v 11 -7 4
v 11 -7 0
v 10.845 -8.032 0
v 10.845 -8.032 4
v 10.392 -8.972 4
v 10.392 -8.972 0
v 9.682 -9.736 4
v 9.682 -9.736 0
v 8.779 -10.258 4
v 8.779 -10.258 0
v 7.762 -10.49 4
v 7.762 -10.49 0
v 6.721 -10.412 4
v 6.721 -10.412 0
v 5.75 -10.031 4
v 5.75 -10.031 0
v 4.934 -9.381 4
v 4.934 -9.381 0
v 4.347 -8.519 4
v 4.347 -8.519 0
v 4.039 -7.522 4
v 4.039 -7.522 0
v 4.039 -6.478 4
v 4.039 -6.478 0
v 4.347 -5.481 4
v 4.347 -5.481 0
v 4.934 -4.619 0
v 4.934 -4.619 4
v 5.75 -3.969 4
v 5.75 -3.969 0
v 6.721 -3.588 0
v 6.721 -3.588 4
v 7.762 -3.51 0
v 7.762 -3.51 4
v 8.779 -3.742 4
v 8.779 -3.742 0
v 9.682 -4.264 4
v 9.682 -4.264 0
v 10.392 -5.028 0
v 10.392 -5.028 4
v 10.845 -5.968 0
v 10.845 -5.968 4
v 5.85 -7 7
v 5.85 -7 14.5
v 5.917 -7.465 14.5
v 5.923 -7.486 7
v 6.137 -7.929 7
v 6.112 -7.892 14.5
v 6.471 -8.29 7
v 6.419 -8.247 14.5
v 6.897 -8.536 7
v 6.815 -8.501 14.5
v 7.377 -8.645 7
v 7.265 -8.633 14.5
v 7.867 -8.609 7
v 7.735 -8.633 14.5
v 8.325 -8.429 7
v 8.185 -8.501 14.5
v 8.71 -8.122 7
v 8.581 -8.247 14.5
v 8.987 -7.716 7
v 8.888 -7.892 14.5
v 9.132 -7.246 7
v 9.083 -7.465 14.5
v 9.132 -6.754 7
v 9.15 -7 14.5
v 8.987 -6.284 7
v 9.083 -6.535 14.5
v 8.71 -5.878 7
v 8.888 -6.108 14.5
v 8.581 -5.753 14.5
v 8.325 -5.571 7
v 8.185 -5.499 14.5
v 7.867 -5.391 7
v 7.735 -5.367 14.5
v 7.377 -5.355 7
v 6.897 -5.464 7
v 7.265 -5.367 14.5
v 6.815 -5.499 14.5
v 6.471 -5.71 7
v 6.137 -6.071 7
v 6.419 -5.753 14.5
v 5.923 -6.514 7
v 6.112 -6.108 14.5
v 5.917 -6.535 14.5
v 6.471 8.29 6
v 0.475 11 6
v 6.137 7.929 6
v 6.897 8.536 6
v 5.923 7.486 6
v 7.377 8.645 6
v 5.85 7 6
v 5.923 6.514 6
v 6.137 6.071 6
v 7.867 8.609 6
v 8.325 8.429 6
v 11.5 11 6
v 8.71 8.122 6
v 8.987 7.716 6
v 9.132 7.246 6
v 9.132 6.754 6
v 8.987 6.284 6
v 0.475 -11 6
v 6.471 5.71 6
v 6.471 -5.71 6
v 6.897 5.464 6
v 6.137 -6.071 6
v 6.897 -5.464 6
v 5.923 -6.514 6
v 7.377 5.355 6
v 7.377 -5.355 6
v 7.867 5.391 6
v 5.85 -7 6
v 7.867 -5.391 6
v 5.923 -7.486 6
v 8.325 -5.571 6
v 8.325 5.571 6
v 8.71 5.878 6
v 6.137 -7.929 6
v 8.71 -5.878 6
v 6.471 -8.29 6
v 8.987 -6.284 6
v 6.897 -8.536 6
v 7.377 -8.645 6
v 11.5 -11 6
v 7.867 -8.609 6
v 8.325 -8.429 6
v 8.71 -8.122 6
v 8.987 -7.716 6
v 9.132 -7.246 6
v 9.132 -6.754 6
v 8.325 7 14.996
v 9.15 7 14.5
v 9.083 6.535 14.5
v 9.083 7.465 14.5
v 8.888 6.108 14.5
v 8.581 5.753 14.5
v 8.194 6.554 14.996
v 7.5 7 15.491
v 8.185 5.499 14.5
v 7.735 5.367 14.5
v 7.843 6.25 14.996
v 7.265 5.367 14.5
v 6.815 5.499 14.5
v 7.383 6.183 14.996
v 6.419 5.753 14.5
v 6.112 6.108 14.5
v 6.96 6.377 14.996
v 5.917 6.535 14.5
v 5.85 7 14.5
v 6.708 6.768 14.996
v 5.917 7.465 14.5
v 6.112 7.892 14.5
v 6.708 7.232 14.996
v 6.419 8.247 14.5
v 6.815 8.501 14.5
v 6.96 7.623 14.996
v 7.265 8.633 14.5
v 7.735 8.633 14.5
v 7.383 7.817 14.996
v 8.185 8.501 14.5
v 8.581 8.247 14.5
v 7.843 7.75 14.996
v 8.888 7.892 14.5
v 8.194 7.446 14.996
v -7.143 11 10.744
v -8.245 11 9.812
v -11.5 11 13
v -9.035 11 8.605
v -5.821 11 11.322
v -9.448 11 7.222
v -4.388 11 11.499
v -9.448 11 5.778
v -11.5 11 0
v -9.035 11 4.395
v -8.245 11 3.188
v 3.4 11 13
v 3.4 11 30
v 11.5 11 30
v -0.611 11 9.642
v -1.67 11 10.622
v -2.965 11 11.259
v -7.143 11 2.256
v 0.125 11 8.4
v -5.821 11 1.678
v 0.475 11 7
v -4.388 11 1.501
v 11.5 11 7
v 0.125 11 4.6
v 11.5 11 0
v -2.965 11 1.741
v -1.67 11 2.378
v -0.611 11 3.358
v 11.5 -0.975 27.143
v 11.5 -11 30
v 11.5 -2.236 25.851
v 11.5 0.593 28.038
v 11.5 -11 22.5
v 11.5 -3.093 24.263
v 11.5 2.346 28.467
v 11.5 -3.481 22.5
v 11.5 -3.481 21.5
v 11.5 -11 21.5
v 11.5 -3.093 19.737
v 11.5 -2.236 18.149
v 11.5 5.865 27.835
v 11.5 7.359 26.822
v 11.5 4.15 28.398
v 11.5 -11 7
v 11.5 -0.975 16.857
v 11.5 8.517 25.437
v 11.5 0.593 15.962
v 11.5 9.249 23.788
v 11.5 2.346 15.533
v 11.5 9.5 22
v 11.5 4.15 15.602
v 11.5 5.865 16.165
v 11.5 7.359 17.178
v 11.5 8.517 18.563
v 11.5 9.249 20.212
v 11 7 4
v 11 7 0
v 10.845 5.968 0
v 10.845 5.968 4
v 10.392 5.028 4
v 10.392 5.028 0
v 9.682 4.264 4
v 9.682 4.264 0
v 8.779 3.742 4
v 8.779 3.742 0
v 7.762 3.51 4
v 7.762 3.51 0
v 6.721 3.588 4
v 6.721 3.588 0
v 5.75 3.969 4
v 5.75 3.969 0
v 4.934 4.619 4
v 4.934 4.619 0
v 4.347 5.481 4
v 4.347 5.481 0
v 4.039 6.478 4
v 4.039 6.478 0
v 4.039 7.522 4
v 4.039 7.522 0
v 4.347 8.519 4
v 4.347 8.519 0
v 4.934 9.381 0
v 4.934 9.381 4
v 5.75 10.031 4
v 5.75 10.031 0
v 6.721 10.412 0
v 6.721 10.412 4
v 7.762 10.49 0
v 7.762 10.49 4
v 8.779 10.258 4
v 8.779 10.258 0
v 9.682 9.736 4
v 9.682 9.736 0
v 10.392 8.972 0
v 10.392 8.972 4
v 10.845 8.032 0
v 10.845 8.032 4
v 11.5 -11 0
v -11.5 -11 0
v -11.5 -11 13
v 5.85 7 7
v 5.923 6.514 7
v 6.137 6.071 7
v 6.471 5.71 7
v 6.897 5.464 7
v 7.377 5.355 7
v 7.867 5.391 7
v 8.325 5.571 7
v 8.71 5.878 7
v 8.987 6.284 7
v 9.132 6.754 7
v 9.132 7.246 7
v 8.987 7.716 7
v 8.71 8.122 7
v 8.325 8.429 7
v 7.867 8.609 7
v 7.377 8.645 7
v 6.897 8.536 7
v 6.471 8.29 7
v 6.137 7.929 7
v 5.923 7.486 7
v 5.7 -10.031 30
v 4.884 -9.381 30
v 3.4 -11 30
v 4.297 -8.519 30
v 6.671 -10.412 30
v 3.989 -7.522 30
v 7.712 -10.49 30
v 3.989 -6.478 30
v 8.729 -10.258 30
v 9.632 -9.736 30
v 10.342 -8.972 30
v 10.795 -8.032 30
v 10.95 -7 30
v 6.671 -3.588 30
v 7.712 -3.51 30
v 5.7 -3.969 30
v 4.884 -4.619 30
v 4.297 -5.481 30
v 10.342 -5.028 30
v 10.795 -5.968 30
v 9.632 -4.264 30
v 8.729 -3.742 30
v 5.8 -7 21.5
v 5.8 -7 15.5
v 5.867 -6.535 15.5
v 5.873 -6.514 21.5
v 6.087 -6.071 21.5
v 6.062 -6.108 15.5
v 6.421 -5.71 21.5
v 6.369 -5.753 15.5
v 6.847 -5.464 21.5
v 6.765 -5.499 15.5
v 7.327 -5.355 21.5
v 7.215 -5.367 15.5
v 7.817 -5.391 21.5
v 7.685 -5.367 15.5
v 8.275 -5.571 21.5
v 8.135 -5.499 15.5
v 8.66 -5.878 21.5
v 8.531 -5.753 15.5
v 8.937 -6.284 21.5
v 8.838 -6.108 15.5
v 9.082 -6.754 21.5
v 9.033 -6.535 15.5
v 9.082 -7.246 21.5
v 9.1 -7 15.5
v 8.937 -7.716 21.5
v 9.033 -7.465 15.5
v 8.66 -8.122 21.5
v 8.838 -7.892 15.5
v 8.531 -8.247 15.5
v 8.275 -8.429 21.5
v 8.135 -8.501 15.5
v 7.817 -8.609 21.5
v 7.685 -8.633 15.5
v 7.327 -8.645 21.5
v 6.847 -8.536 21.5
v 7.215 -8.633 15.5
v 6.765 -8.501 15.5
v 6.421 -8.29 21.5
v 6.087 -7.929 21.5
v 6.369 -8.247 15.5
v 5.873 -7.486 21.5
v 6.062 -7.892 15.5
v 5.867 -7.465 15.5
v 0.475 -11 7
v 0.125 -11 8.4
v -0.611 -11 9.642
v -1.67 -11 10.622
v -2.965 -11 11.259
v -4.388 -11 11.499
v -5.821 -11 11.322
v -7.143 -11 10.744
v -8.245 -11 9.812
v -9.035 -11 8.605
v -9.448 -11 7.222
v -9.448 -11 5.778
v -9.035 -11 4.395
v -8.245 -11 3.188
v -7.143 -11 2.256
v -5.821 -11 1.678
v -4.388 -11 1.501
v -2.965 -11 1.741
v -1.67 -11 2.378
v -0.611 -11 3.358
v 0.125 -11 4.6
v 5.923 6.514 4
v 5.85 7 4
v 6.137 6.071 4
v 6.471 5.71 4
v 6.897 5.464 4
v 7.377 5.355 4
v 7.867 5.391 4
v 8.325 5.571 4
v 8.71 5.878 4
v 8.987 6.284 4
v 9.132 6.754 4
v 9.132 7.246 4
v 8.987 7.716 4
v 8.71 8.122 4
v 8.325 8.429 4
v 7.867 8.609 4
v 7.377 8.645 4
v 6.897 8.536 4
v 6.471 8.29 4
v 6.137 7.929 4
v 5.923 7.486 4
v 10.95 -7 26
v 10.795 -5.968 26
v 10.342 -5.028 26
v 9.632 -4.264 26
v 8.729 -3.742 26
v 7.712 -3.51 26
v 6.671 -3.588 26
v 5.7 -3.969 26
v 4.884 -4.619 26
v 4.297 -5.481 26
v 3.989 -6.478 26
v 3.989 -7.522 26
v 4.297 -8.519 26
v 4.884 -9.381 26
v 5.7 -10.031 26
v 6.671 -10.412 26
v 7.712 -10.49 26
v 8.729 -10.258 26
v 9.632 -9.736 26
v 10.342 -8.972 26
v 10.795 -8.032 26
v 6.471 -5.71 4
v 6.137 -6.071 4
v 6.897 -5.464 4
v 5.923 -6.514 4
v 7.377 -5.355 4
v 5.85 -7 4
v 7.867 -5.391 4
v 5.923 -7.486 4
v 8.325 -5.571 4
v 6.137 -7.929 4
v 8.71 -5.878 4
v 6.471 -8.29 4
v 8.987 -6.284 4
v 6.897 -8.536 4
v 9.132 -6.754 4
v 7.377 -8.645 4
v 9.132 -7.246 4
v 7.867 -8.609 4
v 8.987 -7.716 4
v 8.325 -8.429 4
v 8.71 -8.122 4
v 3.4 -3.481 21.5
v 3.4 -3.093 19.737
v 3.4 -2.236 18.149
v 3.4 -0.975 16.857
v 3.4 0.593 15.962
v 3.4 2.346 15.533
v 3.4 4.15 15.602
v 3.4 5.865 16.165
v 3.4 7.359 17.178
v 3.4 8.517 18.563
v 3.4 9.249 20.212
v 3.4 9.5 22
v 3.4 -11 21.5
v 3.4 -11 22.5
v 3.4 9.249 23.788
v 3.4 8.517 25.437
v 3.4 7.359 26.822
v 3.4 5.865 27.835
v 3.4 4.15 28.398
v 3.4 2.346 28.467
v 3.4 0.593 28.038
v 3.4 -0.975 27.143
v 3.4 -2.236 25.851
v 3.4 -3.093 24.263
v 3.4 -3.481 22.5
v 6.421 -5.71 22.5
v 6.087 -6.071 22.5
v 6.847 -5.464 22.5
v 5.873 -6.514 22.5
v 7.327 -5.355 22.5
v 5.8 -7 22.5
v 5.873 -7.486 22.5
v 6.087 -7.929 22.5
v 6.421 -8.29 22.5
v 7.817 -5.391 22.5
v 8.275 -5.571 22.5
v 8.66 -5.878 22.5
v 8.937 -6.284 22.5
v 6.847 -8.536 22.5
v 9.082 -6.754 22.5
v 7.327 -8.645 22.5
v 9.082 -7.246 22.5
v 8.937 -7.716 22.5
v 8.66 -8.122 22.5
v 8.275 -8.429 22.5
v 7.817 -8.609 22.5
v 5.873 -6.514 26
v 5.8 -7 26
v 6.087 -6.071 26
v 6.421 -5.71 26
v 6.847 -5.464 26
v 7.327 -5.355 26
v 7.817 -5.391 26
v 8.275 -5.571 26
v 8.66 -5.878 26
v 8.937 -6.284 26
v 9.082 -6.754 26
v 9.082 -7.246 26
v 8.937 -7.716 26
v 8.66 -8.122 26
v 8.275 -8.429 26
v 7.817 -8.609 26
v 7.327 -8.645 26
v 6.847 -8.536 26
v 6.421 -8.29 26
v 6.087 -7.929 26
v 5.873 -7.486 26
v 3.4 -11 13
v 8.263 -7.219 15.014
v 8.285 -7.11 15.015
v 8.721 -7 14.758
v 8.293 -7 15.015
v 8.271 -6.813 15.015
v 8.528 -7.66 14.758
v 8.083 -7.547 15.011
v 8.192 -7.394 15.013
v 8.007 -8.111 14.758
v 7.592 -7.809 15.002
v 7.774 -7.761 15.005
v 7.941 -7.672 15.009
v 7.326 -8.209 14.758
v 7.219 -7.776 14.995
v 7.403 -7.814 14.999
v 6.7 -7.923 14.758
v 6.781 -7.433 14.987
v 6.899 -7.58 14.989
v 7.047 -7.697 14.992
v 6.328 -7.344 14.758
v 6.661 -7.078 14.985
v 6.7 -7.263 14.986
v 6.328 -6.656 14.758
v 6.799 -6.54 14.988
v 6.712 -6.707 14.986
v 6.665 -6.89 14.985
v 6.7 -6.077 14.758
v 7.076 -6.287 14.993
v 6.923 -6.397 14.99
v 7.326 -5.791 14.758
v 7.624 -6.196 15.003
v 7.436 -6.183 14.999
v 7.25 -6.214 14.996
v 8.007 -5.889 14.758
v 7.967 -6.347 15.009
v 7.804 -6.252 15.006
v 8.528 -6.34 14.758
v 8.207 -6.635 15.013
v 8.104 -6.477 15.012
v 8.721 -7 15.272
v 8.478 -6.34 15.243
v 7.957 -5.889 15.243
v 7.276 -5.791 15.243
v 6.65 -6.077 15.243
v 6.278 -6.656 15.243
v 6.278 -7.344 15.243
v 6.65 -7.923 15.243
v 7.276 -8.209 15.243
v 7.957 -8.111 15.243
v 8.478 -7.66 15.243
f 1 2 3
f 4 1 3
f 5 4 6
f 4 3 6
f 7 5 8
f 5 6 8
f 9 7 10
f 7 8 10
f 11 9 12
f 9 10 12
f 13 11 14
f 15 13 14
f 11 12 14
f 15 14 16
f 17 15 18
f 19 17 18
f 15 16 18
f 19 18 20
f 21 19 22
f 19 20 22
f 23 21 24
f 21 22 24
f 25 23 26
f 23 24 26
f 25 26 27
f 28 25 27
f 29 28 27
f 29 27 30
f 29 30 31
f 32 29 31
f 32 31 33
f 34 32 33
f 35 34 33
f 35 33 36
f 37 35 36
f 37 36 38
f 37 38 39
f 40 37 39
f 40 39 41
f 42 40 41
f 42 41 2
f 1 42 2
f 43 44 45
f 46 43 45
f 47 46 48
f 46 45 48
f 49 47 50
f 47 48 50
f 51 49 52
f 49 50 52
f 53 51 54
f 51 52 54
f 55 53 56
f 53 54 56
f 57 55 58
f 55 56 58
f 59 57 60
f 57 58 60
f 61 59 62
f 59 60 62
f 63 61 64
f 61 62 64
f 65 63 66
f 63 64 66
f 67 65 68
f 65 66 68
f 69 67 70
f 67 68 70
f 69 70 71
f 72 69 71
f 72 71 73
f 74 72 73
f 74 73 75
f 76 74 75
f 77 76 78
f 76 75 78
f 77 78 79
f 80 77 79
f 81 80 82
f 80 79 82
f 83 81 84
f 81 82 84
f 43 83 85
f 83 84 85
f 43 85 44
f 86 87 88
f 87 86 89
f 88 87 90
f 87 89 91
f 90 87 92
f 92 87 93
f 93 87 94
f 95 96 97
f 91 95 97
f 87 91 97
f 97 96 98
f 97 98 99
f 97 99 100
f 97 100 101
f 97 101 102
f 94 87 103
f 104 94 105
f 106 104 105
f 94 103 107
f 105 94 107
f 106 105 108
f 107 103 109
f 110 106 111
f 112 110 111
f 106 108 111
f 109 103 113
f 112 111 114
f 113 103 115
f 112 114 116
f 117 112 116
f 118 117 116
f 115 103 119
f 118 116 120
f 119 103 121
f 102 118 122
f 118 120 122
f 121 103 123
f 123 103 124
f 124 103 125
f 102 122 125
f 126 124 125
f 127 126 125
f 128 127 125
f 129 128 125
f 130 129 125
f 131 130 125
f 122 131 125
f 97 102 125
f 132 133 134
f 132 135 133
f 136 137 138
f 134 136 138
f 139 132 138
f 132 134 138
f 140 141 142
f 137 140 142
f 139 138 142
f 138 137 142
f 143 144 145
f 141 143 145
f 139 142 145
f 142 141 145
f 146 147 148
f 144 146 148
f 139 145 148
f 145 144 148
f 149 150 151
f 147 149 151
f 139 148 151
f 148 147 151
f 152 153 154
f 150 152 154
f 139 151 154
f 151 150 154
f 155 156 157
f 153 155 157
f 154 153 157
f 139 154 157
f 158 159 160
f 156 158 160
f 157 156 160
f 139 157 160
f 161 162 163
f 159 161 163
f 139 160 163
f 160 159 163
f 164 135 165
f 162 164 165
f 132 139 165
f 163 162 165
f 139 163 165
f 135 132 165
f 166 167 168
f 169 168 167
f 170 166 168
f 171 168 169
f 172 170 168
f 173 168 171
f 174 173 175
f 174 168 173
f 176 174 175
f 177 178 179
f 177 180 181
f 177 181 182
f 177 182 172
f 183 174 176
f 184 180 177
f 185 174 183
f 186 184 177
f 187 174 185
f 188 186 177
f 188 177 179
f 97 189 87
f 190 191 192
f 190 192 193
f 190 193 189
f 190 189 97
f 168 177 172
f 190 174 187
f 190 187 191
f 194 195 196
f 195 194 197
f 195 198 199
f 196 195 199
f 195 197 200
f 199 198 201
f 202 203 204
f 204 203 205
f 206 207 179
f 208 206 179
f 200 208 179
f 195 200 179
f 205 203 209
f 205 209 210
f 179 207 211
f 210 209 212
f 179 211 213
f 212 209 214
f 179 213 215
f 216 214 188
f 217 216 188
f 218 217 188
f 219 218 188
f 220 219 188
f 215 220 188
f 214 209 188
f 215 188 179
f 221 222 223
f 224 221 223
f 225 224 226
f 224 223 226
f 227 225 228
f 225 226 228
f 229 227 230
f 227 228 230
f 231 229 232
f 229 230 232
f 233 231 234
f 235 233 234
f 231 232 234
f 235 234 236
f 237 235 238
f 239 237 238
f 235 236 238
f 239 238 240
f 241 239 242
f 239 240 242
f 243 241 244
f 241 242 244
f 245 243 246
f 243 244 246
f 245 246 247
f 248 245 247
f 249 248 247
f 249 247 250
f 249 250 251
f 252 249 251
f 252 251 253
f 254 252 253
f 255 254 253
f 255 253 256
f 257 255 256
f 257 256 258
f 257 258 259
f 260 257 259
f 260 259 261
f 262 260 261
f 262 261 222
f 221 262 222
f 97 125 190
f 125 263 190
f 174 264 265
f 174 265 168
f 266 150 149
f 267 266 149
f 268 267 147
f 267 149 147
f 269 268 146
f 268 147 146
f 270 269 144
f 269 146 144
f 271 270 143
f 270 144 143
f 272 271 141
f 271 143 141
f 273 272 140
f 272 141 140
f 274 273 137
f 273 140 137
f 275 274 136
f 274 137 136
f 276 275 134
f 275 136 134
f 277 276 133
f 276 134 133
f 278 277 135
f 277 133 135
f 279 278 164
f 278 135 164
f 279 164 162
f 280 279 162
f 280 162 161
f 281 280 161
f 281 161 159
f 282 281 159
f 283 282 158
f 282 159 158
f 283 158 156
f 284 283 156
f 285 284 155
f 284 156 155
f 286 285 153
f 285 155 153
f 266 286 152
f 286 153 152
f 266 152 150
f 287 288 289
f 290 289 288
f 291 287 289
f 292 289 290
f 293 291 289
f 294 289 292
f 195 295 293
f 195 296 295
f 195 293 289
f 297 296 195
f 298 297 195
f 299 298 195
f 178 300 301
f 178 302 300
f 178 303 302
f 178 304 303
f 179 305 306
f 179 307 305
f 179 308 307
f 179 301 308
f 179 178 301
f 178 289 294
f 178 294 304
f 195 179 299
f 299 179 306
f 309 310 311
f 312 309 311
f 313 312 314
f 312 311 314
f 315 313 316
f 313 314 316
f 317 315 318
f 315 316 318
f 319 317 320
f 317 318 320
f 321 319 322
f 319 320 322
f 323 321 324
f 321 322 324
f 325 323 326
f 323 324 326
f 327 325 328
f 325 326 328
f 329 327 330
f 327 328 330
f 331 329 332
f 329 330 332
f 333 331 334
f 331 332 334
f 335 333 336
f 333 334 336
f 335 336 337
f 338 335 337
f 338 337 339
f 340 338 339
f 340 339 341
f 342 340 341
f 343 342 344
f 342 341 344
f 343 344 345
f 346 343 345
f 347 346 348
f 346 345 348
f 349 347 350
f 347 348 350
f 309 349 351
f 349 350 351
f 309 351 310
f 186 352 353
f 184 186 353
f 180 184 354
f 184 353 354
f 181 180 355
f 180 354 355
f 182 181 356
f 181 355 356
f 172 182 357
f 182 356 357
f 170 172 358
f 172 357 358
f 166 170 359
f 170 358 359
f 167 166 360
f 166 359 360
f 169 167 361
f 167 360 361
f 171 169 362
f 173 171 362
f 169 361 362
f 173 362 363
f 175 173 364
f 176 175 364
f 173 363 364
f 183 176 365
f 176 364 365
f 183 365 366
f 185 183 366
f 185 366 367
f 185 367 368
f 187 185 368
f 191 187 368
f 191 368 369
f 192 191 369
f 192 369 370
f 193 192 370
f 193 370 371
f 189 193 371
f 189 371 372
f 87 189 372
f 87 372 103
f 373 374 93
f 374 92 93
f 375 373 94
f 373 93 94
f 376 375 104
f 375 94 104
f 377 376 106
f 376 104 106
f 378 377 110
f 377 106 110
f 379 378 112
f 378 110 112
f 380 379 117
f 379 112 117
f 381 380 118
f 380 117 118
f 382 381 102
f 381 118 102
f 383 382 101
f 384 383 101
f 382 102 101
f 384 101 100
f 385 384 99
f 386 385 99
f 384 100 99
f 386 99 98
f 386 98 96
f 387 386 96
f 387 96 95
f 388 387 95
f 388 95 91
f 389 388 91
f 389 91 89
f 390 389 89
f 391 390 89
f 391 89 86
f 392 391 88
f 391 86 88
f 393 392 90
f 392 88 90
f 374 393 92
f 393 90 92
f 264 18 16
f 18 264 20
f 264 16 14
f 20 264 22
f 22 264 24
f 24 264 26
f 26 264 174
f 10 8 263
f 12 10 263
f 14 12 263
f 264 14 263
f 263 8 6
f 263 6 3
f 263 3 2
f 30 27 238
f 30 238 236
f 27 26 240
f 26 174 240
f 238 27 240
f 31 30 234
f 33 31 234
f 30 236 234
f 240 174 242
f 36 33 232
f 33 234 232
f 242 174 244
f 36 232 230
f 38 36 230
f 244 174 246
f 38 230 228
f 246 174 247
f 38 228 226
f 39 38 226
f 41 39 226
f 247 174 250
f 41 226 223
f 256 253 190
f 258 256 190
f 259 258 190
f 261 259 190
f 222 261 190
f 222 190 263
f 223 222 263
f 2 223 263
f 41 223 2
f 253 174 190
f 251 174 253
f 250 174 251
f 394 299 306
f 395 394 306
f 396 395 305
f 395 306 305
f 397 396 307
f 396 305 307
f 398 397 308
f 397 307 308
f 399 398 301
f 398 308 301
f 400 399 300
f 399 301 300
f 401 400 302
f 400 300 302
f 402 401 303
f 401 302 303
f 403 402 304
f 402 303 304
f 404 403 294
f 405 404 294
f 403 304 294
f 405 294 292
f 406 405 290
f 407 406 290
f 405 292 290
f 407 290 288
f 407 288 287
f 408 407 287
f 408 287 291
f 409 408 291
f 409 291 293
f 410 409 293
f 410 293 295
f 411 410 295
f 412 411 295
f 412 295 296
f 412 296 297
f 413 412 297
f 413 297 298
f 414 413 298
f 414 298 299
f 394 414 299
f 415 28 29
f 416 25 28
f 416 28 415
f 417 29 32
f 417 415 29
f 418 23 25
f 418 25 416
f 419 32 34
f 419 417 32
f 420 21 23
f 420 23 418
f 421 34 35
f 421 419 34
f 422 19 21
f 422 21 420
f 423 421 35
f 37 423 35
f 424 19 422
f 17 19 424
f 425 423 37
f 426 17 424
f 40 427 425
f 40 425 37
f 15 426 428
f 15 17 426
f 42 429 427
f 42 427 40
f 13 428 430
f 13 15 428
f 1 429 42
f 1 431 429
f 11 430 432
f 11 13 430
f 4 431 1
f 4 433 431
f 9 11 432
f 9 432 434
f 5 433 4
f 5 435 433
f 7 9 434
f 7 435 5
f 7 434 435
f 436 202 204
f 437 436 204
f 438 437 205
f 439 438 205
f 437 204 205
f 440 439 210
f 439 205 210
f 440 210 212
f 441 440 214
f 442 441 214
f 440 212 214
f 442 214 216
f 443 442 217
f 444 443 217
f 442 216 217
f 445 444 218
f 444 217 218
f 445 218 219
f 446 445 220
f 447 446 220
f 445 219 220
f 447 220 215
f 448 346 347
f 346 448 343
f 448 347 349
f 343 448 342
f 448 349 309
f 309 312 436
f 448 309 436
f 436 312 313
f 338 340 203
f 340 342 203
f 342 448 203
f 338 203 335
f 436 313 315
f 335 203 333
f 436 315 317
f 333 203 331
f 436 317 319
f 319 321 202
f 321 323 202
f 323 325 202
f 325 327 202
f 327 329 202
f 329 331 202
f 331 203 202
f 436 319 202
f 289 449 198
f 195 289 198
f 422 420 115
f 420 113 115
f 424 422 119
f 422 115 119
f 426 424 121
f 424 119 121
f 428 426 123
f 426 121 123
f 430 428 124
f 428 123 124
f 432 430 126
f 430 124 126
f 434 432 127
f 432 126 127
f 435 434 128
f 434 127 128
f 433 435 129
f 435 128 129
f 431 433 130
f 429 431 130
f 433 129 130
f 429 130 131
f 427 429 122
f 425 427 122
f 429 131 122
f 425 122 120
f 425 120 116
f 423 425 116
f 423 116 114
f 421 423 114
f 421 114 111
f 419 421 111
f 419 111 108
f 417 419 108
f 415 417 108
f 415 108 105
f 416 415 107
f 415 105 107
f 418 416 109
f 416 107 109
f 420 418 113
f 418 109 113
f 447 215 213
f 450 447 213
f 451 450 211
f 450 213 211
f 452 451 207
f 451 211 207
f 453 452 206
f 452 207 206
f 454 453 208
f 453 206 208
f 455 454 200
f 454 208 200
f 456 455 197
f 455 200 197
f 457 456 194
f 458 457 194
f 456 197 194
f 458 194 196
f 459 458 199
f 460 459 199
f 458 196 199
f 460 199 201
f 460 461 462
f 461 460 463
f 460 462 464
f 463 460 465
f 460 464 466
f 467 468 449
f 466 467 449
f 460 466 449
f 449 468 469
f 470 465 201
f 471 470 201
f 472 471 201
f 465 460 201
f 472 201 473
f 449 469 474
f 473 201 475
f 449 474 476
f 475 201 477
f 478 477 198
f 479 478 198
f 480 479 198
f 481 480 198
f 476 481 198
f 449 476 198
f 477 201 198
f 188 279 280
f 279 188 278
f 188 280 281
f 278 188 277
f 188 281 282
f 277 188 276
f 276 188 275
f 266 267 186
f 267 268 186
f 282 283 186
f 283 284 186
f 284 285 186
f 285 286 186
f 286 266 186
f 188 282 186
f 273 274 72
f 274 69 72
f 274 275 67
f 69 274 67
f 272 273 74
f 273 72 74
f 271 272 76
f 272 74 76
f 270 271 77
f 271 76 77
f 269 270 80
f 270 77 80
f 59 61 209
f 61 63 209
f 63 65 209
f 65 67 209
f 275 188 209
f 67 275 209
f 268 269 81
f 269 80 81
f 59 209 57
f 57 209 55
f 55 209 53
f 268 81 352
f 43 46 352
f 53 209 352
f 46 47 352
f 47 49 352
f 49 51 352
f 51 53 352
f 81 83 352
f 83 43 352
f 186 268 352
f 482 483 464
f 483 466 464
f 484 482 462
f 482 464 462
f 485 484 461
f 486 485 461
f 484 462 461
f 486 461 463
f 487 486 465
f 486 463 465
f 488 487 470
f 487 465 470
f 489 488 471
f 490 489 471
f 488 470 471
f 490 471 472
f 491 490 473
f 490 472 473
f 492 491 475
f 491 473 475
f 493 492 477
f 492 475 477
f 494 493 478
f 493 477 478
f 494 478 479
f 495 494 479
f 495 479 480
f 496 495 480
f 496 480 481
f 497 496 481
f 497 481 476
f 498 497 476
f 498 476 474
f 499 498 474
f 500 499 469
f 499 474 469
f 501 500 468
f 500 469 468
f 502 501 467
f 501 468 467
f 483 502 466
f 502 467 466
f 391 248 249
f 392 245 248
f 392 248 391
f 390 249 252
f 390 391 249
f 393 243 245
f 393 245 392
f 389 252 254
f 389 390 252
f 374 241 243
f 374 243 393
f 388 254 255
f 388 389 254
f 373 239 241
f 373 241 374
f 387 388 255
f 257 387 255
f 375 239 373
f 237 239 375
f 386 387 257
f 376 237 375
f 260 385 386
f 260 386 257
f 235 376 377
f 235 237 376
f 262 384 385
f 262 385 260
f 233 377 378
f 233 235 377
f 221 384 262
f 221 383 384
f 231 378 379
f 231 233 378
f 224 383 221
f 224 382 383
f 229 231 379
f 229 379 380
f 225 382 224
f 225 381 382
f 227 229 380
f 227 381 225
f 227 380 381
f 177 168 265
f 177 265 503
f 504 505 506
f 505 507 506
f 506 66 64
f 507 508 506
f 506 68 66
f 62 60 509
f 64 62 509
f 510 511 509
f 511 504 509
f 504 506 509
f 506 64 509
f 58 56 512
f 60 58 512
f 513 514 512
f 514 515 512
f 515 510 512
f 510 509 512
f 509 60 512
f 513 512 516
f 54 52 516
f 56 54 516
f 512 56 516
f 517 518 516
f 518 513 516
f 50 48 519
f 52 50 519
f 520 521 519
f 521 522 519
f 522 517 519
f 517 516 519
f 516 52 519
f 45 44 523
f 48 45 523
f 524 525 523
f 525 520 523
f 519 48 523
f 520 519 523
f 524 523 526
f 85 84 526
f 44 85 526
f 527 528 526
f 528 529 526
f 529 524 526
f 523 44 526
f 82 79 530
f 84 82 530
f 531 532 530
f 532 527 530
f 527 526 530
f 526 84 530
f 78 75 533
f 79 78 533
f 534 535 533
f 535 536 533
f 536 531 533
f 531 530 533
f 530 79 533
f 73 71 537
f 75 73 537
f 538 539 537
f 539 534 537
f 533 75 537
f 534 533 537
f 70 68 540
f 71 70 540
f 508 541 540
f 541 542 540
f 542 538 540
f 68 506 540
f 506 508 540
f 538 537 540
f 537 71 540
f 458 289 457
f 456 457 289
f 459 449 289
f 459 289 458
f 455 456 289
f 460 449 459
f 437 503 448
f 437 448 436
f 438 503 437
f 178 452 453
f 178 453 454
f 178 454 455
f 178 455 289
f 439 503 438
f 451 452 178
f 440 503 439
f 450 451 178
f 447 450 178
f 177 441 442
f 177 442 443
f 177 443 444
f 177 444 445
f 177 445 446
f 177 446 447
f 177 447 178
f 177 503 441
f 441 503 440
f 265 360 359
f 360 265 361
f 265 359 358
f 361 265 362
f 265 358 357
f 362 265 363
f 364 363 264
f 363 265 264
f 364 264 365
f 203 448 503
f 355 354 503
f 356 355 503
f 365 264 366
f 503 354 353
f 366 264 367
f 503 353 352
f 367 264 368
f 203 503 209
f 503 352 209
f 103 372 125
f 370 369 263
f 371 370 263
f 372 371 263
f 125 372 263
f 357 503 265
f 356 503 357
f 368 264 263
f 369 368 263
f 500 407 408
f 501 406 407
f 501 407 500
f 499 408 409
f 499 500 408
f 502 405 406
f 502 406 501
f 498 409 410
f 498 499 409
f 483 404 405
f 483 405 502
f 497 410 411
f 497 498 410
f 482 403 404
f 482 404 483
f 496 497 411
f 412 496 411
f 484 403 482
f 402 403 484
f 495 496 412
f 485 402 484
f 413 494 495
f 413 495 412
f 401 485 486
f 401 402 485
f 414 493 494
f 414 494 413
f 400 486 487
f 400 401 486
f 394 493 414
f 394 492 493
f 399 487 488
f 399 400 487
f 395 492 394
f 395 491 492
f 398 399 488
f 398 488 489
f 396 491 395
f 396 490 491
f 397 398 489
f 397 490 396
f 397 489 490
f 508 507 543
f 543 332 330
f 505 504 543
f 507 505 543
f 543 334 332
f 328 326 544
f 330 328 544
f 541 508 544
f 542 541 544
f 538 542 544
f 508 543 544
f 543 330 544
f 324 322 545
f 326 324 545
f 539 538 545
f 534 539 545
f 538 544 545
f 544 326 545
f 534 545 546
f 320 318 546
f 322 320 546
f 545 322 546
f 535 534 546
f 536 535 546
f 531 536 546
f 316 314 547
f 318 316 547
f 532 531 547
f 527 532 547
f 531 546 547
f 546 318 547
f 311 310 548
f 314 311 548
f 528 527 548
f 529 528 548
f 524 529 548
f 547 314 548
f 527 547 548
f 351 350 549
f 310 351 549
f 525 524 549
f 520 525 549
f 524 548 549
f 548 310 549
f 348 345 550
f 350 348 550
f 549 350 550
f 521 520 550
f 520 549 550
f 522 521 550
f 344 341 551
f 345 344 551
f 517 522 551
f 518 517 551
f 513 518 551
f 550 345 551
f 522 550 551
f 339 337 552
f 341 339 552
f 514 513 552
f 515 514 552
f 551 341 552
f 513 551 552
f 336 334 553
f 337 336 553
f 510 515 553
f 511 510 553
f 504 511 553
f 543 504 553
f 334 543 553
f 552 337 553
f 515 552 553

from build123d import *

# Parameters (mm, degrees)
F0_W            = 23
F0_H            = 22
F1_DEPTH        = 13
F2_W            = 8.1
F2_H            = 22
F3_DEPTH        = 17
F5_DEPTH        = 30
F7_DEPTH        = 25
F9_DEPTH        = 45
F10_DEPTH       = 40
F12_D           = 3.3
F12_DEPTH       = 14.5
F12_CBORE_D     = 7
F12_CBORE_DEPTH = 4
F12_TIP         = 0.9914200214
F13_DEPTH       = 3.05
F15_D           = 3.3
F15_DEPTH       = 14.5
F15_CBORE_D     = 7
F15_CBORE_DEPTH = 4
F15_TIP         = 0.9914200214
F16_DEPTH       = 3.05


with BuildPart() as f1:
    # F0 (on Top) → F1 (new body)
    with BuildSketch(Plane.XY):
        Rectangle(F0_W, F0_H)
    extrude(amount=F1_DEPTH)

    # F2 (on face) → F3 (join)
    with BuildSketch(Plane.XY.offset(13)):
        with Locations((7.45, 0)):
            Rectangle(F2_W, F2_H)
    extrude(amount=F3_DEPTH)

    # F4 (on face) → F5 (cut)
    with BuildSketch(Plane.XZ.offset(11)):
        with BuildLine():
            ThreePointArc((-9.5, 6.5), (-4.5, 1.5), (0.5, 6.5))
            ThreePointArc((0.5, 6.5), (-4.5, 11.5), (-9.5, 6.5))
        make_face()
    extrude(amount=-F5_DEPTH, mode=Mode.SUBTRACT)

    # F6 (on face) → F7 (cut)
    with BuildSketch(Plane.YZ.offset(11.5)):
        with BuildLine():
            ThreePointArc((-3.4807406984, 21.5), (3.2501853916, 15.50481661), (9.5, 22))
            Line((9.5, 22), (3, 22))
            Line((3, 22), (3, 21.5))
            Line((3, 21.5), (-3.4807406984, 21.5))
        make_face()
        with BuildLine():
            Line((3, 22), (9.5, 22))
            ThreePointArc((9.5, 22), (3.2501853916, 28.49518339), (-3.4807406984, 22.5))
            Line((-3.4807406984, 22.5), (3, 22.5))
            Line((3, 22.5), (3, 22))
        make_face()
        with BuildLine():
            Line((3, 21.5), (3, 22))
            Line((3, 22), (-3.5, 22))
            ThreePointArc((-3.5, 22), (-3.49518339, 21.7498146084), (-3.4807406984, 21.5))
            Line((-3.4807406984, 21.5), (3, 21.5))
        make_face()
        with BuildLine():
            Line((-3.5, 22), (3, 22))
            Line((3, 22), (3, 22.5))
            Line((3, 22.5), (-3.4807406984, 22.5))
            ThreePointArc((-3.4807406984, 22.5), (-3.49518339, 22.2501853916), (-3.5, 22))
        make_face()
        with BuildLine():
            ThreePointArc((-3.5, 22), (-3.49518339, 22.2501853916), (-3.4807406984, 22.5))
            Line((-3.4807406984, 22.5), (-15.5890611932, 22.5))
            Line((-15.5890611932, 22.5), (-15.5890611932, 22))
            Line((-15.5890611932, 22), (-3.5, 22))
        make_face()
        with BuildLine():
            Line((-15.5890611932, 21.5), (-3.4807406984, 21.5))
            ThreePointArc((-3.4807406984, 21.5), (-3.49518339, 21.7498146084), (-3.5, 22))
            Line((-3.5, 22), (-15.5890611932, 22))
            Line((-15.5890611932, 22), (-15.5890611932, 21.5))
        make_face()
    extrude(amount=-F7_DEPTH, mode=Mode.SUBTRACT)

    # F8 (on face) → F9 (cut)
    with BuildSketch(Plane.XZ.offset(11)):
        Polygon((27.05, 7), (-4.05, 7), (-4.05, 6.5), (-4.05, 6), (27.05, 6), align=None)
    extrude(amount=-F9_DEPTH, mode=Mode.SUBTRACT)

    # F6 (on face) → F10 (cut)
    with BuildSketch(Plane.YZ.offset(11.5)):
        with BuildLine():
            ThreePointArc((-3.4807406984, 21.5), (3.2501853916, 15.50481661), (9.5, 22))
            Line((9.5, 22), (3, 22))
            Line((3, 22), (3, 21.5))
            Line((3, 21.5), (-3.4807406984, 21.5))
        make_face()
        with BuildLine():
            Line((3, 22), (9.5, 22))
            ThreePointArc((9.5, 22), (3.2501853916, 28.49518339), (-3.4807406984, 22.5))
            Line((-3.4807406984, 22.5), (3, 22.5))
            Line((3, 22.5), (3, 22))
        make_face()
        with BuildLine():
            Line((3, 21.5), (3, 22))
            Line((3, 22), (-3.5, 22))
            ThreePointArc((-3.5, 22), (-3.49518339, 21.7498146084), (-3.4807406984, 21.5))
            Line((-3.4807406984, 21.5), (3, 21.5))
        make_face()
        with BuildLine():
            Line((-3.5, 22), (3, 22))
            Line((3, 22), (3, 22.5))
            Line((3, 22.5), (-3.4807406984, 22.5))
            ThreePointArc((-3.4807406984, 22.5), (-3.49518339, 22.2501853916), (-3.5, 22))
        make_face()
        with BuildLine():
            ThreePointArc((-3.5, 22), (-3.49518339, 22.2501853916), (-3.4807406984, 22.5))
            Line((-3.4807406984, 22.5), (-15.5890611932, 22.5))
            Line((-15.5890611932, 22.5), (-15.5890611932, 22))
            Line((-15.5890611932, 22), (-3.5, 22))
        make_face()
        with BuildLine():
            Line((-15.5890611932, 21.5), (-3.4807406984, 21.5))
            ThreePointArc((-3.4807406984, 21.5), (-3.49518339, 21.7498146084), (-3.5, 22))
            Line((-3.5, 22), (-15.5890611932, 22))
            Line((-15.5890611932, 22), (-15.5890611932, 21.5))
        make_face()
    extrude(amount=-F10_DEPTH, mode=Mode.SUBTRACT)

    # F12
    with Locations(Plane.XY.offset(30)):
        with Locations((7.45, -7)):
            CounterBoreHole(F12_D / 2, F12_CBORE_D / 2, F12_CBORE_DEPTH, depth=F12_DEPTH)
            with Locations((0, 0, -(F12_DEPTH + F12_TIP / 2))):  # 118° drill point
                Cone(0, F12_D / 2, F12_TIP, mode=Mode.SUBTRACT)

    # F11 (on face) → F13 (cut)
    with BuildSketch(Plane.XY.offset(30)):
        with BuildLine():
            ThreePointArc((7.45, -10.445), (9.8859828612, -9.4359828612), (10.895, -7))
            ThreePointArc((10.895, -7), (5.0140171388, -4.5640171388), (7.45, -10.445))
        make_face()
    extrude(amount=-F13_DEPTH, mode=Mode.SUBTRACT)

    # F15
    with Locations(Plane(origin=(0, 0, 0), x_dir=(1, 0, 0), z_dir=(0, 0, -1))):
        with Locations((7.5, 7), (7.5, -7)):
            CounterBoreHole(F15_D / 2, F15_CBORE_D / 2, F15_CBORE_DEPTH, depth=F15_DEPTH)
            with Locations((0, 0, -(F15_DEPTH + F15_TIP / 2))):  # 118° drill point
                Cone(0, F15_D / 2, F15_TIP, mode=Mode.SUBTRACT)

    # F14 (on face) → F16 (cut)
    with BuildSketch(Plane(origin=(0, 0, 0), x_dir=(1, 0, 0), z_dir=(0, 0, -1))):
        with BuildLine():
            ThreePointArc((7.5, 10.445), (5.0640171388, 4.5640171388), (10.945, 7))
            Line((10.945, 7), (7.5, 7))
            Line((7.5, 7), (7.5, 10.445))
        make_face()
        with BuildLine():
            Line((7.5, 7), (10.945, 7))
            ThreePointArc((10.945, 7), (9.9359828612, 9.4359828612), (7.5, 10.445))
            Line((7.5, 10.445), (7.5, 7))
        make_face()
        with BuildLine():
            ThreePointArc((10.945, -7), (5.0640171388, -4.5640171388), (7.5, -10.445))
            Line((7.5, -10.445), (7.5, -7))
            Line((7.5, -7), (10.945, -7))
        make_face()
        with BuildLine():
            Line((7.5, -7), (7.5, -10.445))
            ThreePointArc((7.5, -10.445), (9.9359828612, -9.4359828612), (10.945, -7))
            Line((10.945, -7), (7.5, -7))
        make_face()
    extrude(amount=-F16_DEPTH, mode=Mode.SUBTRACT)


solid = f1.part
